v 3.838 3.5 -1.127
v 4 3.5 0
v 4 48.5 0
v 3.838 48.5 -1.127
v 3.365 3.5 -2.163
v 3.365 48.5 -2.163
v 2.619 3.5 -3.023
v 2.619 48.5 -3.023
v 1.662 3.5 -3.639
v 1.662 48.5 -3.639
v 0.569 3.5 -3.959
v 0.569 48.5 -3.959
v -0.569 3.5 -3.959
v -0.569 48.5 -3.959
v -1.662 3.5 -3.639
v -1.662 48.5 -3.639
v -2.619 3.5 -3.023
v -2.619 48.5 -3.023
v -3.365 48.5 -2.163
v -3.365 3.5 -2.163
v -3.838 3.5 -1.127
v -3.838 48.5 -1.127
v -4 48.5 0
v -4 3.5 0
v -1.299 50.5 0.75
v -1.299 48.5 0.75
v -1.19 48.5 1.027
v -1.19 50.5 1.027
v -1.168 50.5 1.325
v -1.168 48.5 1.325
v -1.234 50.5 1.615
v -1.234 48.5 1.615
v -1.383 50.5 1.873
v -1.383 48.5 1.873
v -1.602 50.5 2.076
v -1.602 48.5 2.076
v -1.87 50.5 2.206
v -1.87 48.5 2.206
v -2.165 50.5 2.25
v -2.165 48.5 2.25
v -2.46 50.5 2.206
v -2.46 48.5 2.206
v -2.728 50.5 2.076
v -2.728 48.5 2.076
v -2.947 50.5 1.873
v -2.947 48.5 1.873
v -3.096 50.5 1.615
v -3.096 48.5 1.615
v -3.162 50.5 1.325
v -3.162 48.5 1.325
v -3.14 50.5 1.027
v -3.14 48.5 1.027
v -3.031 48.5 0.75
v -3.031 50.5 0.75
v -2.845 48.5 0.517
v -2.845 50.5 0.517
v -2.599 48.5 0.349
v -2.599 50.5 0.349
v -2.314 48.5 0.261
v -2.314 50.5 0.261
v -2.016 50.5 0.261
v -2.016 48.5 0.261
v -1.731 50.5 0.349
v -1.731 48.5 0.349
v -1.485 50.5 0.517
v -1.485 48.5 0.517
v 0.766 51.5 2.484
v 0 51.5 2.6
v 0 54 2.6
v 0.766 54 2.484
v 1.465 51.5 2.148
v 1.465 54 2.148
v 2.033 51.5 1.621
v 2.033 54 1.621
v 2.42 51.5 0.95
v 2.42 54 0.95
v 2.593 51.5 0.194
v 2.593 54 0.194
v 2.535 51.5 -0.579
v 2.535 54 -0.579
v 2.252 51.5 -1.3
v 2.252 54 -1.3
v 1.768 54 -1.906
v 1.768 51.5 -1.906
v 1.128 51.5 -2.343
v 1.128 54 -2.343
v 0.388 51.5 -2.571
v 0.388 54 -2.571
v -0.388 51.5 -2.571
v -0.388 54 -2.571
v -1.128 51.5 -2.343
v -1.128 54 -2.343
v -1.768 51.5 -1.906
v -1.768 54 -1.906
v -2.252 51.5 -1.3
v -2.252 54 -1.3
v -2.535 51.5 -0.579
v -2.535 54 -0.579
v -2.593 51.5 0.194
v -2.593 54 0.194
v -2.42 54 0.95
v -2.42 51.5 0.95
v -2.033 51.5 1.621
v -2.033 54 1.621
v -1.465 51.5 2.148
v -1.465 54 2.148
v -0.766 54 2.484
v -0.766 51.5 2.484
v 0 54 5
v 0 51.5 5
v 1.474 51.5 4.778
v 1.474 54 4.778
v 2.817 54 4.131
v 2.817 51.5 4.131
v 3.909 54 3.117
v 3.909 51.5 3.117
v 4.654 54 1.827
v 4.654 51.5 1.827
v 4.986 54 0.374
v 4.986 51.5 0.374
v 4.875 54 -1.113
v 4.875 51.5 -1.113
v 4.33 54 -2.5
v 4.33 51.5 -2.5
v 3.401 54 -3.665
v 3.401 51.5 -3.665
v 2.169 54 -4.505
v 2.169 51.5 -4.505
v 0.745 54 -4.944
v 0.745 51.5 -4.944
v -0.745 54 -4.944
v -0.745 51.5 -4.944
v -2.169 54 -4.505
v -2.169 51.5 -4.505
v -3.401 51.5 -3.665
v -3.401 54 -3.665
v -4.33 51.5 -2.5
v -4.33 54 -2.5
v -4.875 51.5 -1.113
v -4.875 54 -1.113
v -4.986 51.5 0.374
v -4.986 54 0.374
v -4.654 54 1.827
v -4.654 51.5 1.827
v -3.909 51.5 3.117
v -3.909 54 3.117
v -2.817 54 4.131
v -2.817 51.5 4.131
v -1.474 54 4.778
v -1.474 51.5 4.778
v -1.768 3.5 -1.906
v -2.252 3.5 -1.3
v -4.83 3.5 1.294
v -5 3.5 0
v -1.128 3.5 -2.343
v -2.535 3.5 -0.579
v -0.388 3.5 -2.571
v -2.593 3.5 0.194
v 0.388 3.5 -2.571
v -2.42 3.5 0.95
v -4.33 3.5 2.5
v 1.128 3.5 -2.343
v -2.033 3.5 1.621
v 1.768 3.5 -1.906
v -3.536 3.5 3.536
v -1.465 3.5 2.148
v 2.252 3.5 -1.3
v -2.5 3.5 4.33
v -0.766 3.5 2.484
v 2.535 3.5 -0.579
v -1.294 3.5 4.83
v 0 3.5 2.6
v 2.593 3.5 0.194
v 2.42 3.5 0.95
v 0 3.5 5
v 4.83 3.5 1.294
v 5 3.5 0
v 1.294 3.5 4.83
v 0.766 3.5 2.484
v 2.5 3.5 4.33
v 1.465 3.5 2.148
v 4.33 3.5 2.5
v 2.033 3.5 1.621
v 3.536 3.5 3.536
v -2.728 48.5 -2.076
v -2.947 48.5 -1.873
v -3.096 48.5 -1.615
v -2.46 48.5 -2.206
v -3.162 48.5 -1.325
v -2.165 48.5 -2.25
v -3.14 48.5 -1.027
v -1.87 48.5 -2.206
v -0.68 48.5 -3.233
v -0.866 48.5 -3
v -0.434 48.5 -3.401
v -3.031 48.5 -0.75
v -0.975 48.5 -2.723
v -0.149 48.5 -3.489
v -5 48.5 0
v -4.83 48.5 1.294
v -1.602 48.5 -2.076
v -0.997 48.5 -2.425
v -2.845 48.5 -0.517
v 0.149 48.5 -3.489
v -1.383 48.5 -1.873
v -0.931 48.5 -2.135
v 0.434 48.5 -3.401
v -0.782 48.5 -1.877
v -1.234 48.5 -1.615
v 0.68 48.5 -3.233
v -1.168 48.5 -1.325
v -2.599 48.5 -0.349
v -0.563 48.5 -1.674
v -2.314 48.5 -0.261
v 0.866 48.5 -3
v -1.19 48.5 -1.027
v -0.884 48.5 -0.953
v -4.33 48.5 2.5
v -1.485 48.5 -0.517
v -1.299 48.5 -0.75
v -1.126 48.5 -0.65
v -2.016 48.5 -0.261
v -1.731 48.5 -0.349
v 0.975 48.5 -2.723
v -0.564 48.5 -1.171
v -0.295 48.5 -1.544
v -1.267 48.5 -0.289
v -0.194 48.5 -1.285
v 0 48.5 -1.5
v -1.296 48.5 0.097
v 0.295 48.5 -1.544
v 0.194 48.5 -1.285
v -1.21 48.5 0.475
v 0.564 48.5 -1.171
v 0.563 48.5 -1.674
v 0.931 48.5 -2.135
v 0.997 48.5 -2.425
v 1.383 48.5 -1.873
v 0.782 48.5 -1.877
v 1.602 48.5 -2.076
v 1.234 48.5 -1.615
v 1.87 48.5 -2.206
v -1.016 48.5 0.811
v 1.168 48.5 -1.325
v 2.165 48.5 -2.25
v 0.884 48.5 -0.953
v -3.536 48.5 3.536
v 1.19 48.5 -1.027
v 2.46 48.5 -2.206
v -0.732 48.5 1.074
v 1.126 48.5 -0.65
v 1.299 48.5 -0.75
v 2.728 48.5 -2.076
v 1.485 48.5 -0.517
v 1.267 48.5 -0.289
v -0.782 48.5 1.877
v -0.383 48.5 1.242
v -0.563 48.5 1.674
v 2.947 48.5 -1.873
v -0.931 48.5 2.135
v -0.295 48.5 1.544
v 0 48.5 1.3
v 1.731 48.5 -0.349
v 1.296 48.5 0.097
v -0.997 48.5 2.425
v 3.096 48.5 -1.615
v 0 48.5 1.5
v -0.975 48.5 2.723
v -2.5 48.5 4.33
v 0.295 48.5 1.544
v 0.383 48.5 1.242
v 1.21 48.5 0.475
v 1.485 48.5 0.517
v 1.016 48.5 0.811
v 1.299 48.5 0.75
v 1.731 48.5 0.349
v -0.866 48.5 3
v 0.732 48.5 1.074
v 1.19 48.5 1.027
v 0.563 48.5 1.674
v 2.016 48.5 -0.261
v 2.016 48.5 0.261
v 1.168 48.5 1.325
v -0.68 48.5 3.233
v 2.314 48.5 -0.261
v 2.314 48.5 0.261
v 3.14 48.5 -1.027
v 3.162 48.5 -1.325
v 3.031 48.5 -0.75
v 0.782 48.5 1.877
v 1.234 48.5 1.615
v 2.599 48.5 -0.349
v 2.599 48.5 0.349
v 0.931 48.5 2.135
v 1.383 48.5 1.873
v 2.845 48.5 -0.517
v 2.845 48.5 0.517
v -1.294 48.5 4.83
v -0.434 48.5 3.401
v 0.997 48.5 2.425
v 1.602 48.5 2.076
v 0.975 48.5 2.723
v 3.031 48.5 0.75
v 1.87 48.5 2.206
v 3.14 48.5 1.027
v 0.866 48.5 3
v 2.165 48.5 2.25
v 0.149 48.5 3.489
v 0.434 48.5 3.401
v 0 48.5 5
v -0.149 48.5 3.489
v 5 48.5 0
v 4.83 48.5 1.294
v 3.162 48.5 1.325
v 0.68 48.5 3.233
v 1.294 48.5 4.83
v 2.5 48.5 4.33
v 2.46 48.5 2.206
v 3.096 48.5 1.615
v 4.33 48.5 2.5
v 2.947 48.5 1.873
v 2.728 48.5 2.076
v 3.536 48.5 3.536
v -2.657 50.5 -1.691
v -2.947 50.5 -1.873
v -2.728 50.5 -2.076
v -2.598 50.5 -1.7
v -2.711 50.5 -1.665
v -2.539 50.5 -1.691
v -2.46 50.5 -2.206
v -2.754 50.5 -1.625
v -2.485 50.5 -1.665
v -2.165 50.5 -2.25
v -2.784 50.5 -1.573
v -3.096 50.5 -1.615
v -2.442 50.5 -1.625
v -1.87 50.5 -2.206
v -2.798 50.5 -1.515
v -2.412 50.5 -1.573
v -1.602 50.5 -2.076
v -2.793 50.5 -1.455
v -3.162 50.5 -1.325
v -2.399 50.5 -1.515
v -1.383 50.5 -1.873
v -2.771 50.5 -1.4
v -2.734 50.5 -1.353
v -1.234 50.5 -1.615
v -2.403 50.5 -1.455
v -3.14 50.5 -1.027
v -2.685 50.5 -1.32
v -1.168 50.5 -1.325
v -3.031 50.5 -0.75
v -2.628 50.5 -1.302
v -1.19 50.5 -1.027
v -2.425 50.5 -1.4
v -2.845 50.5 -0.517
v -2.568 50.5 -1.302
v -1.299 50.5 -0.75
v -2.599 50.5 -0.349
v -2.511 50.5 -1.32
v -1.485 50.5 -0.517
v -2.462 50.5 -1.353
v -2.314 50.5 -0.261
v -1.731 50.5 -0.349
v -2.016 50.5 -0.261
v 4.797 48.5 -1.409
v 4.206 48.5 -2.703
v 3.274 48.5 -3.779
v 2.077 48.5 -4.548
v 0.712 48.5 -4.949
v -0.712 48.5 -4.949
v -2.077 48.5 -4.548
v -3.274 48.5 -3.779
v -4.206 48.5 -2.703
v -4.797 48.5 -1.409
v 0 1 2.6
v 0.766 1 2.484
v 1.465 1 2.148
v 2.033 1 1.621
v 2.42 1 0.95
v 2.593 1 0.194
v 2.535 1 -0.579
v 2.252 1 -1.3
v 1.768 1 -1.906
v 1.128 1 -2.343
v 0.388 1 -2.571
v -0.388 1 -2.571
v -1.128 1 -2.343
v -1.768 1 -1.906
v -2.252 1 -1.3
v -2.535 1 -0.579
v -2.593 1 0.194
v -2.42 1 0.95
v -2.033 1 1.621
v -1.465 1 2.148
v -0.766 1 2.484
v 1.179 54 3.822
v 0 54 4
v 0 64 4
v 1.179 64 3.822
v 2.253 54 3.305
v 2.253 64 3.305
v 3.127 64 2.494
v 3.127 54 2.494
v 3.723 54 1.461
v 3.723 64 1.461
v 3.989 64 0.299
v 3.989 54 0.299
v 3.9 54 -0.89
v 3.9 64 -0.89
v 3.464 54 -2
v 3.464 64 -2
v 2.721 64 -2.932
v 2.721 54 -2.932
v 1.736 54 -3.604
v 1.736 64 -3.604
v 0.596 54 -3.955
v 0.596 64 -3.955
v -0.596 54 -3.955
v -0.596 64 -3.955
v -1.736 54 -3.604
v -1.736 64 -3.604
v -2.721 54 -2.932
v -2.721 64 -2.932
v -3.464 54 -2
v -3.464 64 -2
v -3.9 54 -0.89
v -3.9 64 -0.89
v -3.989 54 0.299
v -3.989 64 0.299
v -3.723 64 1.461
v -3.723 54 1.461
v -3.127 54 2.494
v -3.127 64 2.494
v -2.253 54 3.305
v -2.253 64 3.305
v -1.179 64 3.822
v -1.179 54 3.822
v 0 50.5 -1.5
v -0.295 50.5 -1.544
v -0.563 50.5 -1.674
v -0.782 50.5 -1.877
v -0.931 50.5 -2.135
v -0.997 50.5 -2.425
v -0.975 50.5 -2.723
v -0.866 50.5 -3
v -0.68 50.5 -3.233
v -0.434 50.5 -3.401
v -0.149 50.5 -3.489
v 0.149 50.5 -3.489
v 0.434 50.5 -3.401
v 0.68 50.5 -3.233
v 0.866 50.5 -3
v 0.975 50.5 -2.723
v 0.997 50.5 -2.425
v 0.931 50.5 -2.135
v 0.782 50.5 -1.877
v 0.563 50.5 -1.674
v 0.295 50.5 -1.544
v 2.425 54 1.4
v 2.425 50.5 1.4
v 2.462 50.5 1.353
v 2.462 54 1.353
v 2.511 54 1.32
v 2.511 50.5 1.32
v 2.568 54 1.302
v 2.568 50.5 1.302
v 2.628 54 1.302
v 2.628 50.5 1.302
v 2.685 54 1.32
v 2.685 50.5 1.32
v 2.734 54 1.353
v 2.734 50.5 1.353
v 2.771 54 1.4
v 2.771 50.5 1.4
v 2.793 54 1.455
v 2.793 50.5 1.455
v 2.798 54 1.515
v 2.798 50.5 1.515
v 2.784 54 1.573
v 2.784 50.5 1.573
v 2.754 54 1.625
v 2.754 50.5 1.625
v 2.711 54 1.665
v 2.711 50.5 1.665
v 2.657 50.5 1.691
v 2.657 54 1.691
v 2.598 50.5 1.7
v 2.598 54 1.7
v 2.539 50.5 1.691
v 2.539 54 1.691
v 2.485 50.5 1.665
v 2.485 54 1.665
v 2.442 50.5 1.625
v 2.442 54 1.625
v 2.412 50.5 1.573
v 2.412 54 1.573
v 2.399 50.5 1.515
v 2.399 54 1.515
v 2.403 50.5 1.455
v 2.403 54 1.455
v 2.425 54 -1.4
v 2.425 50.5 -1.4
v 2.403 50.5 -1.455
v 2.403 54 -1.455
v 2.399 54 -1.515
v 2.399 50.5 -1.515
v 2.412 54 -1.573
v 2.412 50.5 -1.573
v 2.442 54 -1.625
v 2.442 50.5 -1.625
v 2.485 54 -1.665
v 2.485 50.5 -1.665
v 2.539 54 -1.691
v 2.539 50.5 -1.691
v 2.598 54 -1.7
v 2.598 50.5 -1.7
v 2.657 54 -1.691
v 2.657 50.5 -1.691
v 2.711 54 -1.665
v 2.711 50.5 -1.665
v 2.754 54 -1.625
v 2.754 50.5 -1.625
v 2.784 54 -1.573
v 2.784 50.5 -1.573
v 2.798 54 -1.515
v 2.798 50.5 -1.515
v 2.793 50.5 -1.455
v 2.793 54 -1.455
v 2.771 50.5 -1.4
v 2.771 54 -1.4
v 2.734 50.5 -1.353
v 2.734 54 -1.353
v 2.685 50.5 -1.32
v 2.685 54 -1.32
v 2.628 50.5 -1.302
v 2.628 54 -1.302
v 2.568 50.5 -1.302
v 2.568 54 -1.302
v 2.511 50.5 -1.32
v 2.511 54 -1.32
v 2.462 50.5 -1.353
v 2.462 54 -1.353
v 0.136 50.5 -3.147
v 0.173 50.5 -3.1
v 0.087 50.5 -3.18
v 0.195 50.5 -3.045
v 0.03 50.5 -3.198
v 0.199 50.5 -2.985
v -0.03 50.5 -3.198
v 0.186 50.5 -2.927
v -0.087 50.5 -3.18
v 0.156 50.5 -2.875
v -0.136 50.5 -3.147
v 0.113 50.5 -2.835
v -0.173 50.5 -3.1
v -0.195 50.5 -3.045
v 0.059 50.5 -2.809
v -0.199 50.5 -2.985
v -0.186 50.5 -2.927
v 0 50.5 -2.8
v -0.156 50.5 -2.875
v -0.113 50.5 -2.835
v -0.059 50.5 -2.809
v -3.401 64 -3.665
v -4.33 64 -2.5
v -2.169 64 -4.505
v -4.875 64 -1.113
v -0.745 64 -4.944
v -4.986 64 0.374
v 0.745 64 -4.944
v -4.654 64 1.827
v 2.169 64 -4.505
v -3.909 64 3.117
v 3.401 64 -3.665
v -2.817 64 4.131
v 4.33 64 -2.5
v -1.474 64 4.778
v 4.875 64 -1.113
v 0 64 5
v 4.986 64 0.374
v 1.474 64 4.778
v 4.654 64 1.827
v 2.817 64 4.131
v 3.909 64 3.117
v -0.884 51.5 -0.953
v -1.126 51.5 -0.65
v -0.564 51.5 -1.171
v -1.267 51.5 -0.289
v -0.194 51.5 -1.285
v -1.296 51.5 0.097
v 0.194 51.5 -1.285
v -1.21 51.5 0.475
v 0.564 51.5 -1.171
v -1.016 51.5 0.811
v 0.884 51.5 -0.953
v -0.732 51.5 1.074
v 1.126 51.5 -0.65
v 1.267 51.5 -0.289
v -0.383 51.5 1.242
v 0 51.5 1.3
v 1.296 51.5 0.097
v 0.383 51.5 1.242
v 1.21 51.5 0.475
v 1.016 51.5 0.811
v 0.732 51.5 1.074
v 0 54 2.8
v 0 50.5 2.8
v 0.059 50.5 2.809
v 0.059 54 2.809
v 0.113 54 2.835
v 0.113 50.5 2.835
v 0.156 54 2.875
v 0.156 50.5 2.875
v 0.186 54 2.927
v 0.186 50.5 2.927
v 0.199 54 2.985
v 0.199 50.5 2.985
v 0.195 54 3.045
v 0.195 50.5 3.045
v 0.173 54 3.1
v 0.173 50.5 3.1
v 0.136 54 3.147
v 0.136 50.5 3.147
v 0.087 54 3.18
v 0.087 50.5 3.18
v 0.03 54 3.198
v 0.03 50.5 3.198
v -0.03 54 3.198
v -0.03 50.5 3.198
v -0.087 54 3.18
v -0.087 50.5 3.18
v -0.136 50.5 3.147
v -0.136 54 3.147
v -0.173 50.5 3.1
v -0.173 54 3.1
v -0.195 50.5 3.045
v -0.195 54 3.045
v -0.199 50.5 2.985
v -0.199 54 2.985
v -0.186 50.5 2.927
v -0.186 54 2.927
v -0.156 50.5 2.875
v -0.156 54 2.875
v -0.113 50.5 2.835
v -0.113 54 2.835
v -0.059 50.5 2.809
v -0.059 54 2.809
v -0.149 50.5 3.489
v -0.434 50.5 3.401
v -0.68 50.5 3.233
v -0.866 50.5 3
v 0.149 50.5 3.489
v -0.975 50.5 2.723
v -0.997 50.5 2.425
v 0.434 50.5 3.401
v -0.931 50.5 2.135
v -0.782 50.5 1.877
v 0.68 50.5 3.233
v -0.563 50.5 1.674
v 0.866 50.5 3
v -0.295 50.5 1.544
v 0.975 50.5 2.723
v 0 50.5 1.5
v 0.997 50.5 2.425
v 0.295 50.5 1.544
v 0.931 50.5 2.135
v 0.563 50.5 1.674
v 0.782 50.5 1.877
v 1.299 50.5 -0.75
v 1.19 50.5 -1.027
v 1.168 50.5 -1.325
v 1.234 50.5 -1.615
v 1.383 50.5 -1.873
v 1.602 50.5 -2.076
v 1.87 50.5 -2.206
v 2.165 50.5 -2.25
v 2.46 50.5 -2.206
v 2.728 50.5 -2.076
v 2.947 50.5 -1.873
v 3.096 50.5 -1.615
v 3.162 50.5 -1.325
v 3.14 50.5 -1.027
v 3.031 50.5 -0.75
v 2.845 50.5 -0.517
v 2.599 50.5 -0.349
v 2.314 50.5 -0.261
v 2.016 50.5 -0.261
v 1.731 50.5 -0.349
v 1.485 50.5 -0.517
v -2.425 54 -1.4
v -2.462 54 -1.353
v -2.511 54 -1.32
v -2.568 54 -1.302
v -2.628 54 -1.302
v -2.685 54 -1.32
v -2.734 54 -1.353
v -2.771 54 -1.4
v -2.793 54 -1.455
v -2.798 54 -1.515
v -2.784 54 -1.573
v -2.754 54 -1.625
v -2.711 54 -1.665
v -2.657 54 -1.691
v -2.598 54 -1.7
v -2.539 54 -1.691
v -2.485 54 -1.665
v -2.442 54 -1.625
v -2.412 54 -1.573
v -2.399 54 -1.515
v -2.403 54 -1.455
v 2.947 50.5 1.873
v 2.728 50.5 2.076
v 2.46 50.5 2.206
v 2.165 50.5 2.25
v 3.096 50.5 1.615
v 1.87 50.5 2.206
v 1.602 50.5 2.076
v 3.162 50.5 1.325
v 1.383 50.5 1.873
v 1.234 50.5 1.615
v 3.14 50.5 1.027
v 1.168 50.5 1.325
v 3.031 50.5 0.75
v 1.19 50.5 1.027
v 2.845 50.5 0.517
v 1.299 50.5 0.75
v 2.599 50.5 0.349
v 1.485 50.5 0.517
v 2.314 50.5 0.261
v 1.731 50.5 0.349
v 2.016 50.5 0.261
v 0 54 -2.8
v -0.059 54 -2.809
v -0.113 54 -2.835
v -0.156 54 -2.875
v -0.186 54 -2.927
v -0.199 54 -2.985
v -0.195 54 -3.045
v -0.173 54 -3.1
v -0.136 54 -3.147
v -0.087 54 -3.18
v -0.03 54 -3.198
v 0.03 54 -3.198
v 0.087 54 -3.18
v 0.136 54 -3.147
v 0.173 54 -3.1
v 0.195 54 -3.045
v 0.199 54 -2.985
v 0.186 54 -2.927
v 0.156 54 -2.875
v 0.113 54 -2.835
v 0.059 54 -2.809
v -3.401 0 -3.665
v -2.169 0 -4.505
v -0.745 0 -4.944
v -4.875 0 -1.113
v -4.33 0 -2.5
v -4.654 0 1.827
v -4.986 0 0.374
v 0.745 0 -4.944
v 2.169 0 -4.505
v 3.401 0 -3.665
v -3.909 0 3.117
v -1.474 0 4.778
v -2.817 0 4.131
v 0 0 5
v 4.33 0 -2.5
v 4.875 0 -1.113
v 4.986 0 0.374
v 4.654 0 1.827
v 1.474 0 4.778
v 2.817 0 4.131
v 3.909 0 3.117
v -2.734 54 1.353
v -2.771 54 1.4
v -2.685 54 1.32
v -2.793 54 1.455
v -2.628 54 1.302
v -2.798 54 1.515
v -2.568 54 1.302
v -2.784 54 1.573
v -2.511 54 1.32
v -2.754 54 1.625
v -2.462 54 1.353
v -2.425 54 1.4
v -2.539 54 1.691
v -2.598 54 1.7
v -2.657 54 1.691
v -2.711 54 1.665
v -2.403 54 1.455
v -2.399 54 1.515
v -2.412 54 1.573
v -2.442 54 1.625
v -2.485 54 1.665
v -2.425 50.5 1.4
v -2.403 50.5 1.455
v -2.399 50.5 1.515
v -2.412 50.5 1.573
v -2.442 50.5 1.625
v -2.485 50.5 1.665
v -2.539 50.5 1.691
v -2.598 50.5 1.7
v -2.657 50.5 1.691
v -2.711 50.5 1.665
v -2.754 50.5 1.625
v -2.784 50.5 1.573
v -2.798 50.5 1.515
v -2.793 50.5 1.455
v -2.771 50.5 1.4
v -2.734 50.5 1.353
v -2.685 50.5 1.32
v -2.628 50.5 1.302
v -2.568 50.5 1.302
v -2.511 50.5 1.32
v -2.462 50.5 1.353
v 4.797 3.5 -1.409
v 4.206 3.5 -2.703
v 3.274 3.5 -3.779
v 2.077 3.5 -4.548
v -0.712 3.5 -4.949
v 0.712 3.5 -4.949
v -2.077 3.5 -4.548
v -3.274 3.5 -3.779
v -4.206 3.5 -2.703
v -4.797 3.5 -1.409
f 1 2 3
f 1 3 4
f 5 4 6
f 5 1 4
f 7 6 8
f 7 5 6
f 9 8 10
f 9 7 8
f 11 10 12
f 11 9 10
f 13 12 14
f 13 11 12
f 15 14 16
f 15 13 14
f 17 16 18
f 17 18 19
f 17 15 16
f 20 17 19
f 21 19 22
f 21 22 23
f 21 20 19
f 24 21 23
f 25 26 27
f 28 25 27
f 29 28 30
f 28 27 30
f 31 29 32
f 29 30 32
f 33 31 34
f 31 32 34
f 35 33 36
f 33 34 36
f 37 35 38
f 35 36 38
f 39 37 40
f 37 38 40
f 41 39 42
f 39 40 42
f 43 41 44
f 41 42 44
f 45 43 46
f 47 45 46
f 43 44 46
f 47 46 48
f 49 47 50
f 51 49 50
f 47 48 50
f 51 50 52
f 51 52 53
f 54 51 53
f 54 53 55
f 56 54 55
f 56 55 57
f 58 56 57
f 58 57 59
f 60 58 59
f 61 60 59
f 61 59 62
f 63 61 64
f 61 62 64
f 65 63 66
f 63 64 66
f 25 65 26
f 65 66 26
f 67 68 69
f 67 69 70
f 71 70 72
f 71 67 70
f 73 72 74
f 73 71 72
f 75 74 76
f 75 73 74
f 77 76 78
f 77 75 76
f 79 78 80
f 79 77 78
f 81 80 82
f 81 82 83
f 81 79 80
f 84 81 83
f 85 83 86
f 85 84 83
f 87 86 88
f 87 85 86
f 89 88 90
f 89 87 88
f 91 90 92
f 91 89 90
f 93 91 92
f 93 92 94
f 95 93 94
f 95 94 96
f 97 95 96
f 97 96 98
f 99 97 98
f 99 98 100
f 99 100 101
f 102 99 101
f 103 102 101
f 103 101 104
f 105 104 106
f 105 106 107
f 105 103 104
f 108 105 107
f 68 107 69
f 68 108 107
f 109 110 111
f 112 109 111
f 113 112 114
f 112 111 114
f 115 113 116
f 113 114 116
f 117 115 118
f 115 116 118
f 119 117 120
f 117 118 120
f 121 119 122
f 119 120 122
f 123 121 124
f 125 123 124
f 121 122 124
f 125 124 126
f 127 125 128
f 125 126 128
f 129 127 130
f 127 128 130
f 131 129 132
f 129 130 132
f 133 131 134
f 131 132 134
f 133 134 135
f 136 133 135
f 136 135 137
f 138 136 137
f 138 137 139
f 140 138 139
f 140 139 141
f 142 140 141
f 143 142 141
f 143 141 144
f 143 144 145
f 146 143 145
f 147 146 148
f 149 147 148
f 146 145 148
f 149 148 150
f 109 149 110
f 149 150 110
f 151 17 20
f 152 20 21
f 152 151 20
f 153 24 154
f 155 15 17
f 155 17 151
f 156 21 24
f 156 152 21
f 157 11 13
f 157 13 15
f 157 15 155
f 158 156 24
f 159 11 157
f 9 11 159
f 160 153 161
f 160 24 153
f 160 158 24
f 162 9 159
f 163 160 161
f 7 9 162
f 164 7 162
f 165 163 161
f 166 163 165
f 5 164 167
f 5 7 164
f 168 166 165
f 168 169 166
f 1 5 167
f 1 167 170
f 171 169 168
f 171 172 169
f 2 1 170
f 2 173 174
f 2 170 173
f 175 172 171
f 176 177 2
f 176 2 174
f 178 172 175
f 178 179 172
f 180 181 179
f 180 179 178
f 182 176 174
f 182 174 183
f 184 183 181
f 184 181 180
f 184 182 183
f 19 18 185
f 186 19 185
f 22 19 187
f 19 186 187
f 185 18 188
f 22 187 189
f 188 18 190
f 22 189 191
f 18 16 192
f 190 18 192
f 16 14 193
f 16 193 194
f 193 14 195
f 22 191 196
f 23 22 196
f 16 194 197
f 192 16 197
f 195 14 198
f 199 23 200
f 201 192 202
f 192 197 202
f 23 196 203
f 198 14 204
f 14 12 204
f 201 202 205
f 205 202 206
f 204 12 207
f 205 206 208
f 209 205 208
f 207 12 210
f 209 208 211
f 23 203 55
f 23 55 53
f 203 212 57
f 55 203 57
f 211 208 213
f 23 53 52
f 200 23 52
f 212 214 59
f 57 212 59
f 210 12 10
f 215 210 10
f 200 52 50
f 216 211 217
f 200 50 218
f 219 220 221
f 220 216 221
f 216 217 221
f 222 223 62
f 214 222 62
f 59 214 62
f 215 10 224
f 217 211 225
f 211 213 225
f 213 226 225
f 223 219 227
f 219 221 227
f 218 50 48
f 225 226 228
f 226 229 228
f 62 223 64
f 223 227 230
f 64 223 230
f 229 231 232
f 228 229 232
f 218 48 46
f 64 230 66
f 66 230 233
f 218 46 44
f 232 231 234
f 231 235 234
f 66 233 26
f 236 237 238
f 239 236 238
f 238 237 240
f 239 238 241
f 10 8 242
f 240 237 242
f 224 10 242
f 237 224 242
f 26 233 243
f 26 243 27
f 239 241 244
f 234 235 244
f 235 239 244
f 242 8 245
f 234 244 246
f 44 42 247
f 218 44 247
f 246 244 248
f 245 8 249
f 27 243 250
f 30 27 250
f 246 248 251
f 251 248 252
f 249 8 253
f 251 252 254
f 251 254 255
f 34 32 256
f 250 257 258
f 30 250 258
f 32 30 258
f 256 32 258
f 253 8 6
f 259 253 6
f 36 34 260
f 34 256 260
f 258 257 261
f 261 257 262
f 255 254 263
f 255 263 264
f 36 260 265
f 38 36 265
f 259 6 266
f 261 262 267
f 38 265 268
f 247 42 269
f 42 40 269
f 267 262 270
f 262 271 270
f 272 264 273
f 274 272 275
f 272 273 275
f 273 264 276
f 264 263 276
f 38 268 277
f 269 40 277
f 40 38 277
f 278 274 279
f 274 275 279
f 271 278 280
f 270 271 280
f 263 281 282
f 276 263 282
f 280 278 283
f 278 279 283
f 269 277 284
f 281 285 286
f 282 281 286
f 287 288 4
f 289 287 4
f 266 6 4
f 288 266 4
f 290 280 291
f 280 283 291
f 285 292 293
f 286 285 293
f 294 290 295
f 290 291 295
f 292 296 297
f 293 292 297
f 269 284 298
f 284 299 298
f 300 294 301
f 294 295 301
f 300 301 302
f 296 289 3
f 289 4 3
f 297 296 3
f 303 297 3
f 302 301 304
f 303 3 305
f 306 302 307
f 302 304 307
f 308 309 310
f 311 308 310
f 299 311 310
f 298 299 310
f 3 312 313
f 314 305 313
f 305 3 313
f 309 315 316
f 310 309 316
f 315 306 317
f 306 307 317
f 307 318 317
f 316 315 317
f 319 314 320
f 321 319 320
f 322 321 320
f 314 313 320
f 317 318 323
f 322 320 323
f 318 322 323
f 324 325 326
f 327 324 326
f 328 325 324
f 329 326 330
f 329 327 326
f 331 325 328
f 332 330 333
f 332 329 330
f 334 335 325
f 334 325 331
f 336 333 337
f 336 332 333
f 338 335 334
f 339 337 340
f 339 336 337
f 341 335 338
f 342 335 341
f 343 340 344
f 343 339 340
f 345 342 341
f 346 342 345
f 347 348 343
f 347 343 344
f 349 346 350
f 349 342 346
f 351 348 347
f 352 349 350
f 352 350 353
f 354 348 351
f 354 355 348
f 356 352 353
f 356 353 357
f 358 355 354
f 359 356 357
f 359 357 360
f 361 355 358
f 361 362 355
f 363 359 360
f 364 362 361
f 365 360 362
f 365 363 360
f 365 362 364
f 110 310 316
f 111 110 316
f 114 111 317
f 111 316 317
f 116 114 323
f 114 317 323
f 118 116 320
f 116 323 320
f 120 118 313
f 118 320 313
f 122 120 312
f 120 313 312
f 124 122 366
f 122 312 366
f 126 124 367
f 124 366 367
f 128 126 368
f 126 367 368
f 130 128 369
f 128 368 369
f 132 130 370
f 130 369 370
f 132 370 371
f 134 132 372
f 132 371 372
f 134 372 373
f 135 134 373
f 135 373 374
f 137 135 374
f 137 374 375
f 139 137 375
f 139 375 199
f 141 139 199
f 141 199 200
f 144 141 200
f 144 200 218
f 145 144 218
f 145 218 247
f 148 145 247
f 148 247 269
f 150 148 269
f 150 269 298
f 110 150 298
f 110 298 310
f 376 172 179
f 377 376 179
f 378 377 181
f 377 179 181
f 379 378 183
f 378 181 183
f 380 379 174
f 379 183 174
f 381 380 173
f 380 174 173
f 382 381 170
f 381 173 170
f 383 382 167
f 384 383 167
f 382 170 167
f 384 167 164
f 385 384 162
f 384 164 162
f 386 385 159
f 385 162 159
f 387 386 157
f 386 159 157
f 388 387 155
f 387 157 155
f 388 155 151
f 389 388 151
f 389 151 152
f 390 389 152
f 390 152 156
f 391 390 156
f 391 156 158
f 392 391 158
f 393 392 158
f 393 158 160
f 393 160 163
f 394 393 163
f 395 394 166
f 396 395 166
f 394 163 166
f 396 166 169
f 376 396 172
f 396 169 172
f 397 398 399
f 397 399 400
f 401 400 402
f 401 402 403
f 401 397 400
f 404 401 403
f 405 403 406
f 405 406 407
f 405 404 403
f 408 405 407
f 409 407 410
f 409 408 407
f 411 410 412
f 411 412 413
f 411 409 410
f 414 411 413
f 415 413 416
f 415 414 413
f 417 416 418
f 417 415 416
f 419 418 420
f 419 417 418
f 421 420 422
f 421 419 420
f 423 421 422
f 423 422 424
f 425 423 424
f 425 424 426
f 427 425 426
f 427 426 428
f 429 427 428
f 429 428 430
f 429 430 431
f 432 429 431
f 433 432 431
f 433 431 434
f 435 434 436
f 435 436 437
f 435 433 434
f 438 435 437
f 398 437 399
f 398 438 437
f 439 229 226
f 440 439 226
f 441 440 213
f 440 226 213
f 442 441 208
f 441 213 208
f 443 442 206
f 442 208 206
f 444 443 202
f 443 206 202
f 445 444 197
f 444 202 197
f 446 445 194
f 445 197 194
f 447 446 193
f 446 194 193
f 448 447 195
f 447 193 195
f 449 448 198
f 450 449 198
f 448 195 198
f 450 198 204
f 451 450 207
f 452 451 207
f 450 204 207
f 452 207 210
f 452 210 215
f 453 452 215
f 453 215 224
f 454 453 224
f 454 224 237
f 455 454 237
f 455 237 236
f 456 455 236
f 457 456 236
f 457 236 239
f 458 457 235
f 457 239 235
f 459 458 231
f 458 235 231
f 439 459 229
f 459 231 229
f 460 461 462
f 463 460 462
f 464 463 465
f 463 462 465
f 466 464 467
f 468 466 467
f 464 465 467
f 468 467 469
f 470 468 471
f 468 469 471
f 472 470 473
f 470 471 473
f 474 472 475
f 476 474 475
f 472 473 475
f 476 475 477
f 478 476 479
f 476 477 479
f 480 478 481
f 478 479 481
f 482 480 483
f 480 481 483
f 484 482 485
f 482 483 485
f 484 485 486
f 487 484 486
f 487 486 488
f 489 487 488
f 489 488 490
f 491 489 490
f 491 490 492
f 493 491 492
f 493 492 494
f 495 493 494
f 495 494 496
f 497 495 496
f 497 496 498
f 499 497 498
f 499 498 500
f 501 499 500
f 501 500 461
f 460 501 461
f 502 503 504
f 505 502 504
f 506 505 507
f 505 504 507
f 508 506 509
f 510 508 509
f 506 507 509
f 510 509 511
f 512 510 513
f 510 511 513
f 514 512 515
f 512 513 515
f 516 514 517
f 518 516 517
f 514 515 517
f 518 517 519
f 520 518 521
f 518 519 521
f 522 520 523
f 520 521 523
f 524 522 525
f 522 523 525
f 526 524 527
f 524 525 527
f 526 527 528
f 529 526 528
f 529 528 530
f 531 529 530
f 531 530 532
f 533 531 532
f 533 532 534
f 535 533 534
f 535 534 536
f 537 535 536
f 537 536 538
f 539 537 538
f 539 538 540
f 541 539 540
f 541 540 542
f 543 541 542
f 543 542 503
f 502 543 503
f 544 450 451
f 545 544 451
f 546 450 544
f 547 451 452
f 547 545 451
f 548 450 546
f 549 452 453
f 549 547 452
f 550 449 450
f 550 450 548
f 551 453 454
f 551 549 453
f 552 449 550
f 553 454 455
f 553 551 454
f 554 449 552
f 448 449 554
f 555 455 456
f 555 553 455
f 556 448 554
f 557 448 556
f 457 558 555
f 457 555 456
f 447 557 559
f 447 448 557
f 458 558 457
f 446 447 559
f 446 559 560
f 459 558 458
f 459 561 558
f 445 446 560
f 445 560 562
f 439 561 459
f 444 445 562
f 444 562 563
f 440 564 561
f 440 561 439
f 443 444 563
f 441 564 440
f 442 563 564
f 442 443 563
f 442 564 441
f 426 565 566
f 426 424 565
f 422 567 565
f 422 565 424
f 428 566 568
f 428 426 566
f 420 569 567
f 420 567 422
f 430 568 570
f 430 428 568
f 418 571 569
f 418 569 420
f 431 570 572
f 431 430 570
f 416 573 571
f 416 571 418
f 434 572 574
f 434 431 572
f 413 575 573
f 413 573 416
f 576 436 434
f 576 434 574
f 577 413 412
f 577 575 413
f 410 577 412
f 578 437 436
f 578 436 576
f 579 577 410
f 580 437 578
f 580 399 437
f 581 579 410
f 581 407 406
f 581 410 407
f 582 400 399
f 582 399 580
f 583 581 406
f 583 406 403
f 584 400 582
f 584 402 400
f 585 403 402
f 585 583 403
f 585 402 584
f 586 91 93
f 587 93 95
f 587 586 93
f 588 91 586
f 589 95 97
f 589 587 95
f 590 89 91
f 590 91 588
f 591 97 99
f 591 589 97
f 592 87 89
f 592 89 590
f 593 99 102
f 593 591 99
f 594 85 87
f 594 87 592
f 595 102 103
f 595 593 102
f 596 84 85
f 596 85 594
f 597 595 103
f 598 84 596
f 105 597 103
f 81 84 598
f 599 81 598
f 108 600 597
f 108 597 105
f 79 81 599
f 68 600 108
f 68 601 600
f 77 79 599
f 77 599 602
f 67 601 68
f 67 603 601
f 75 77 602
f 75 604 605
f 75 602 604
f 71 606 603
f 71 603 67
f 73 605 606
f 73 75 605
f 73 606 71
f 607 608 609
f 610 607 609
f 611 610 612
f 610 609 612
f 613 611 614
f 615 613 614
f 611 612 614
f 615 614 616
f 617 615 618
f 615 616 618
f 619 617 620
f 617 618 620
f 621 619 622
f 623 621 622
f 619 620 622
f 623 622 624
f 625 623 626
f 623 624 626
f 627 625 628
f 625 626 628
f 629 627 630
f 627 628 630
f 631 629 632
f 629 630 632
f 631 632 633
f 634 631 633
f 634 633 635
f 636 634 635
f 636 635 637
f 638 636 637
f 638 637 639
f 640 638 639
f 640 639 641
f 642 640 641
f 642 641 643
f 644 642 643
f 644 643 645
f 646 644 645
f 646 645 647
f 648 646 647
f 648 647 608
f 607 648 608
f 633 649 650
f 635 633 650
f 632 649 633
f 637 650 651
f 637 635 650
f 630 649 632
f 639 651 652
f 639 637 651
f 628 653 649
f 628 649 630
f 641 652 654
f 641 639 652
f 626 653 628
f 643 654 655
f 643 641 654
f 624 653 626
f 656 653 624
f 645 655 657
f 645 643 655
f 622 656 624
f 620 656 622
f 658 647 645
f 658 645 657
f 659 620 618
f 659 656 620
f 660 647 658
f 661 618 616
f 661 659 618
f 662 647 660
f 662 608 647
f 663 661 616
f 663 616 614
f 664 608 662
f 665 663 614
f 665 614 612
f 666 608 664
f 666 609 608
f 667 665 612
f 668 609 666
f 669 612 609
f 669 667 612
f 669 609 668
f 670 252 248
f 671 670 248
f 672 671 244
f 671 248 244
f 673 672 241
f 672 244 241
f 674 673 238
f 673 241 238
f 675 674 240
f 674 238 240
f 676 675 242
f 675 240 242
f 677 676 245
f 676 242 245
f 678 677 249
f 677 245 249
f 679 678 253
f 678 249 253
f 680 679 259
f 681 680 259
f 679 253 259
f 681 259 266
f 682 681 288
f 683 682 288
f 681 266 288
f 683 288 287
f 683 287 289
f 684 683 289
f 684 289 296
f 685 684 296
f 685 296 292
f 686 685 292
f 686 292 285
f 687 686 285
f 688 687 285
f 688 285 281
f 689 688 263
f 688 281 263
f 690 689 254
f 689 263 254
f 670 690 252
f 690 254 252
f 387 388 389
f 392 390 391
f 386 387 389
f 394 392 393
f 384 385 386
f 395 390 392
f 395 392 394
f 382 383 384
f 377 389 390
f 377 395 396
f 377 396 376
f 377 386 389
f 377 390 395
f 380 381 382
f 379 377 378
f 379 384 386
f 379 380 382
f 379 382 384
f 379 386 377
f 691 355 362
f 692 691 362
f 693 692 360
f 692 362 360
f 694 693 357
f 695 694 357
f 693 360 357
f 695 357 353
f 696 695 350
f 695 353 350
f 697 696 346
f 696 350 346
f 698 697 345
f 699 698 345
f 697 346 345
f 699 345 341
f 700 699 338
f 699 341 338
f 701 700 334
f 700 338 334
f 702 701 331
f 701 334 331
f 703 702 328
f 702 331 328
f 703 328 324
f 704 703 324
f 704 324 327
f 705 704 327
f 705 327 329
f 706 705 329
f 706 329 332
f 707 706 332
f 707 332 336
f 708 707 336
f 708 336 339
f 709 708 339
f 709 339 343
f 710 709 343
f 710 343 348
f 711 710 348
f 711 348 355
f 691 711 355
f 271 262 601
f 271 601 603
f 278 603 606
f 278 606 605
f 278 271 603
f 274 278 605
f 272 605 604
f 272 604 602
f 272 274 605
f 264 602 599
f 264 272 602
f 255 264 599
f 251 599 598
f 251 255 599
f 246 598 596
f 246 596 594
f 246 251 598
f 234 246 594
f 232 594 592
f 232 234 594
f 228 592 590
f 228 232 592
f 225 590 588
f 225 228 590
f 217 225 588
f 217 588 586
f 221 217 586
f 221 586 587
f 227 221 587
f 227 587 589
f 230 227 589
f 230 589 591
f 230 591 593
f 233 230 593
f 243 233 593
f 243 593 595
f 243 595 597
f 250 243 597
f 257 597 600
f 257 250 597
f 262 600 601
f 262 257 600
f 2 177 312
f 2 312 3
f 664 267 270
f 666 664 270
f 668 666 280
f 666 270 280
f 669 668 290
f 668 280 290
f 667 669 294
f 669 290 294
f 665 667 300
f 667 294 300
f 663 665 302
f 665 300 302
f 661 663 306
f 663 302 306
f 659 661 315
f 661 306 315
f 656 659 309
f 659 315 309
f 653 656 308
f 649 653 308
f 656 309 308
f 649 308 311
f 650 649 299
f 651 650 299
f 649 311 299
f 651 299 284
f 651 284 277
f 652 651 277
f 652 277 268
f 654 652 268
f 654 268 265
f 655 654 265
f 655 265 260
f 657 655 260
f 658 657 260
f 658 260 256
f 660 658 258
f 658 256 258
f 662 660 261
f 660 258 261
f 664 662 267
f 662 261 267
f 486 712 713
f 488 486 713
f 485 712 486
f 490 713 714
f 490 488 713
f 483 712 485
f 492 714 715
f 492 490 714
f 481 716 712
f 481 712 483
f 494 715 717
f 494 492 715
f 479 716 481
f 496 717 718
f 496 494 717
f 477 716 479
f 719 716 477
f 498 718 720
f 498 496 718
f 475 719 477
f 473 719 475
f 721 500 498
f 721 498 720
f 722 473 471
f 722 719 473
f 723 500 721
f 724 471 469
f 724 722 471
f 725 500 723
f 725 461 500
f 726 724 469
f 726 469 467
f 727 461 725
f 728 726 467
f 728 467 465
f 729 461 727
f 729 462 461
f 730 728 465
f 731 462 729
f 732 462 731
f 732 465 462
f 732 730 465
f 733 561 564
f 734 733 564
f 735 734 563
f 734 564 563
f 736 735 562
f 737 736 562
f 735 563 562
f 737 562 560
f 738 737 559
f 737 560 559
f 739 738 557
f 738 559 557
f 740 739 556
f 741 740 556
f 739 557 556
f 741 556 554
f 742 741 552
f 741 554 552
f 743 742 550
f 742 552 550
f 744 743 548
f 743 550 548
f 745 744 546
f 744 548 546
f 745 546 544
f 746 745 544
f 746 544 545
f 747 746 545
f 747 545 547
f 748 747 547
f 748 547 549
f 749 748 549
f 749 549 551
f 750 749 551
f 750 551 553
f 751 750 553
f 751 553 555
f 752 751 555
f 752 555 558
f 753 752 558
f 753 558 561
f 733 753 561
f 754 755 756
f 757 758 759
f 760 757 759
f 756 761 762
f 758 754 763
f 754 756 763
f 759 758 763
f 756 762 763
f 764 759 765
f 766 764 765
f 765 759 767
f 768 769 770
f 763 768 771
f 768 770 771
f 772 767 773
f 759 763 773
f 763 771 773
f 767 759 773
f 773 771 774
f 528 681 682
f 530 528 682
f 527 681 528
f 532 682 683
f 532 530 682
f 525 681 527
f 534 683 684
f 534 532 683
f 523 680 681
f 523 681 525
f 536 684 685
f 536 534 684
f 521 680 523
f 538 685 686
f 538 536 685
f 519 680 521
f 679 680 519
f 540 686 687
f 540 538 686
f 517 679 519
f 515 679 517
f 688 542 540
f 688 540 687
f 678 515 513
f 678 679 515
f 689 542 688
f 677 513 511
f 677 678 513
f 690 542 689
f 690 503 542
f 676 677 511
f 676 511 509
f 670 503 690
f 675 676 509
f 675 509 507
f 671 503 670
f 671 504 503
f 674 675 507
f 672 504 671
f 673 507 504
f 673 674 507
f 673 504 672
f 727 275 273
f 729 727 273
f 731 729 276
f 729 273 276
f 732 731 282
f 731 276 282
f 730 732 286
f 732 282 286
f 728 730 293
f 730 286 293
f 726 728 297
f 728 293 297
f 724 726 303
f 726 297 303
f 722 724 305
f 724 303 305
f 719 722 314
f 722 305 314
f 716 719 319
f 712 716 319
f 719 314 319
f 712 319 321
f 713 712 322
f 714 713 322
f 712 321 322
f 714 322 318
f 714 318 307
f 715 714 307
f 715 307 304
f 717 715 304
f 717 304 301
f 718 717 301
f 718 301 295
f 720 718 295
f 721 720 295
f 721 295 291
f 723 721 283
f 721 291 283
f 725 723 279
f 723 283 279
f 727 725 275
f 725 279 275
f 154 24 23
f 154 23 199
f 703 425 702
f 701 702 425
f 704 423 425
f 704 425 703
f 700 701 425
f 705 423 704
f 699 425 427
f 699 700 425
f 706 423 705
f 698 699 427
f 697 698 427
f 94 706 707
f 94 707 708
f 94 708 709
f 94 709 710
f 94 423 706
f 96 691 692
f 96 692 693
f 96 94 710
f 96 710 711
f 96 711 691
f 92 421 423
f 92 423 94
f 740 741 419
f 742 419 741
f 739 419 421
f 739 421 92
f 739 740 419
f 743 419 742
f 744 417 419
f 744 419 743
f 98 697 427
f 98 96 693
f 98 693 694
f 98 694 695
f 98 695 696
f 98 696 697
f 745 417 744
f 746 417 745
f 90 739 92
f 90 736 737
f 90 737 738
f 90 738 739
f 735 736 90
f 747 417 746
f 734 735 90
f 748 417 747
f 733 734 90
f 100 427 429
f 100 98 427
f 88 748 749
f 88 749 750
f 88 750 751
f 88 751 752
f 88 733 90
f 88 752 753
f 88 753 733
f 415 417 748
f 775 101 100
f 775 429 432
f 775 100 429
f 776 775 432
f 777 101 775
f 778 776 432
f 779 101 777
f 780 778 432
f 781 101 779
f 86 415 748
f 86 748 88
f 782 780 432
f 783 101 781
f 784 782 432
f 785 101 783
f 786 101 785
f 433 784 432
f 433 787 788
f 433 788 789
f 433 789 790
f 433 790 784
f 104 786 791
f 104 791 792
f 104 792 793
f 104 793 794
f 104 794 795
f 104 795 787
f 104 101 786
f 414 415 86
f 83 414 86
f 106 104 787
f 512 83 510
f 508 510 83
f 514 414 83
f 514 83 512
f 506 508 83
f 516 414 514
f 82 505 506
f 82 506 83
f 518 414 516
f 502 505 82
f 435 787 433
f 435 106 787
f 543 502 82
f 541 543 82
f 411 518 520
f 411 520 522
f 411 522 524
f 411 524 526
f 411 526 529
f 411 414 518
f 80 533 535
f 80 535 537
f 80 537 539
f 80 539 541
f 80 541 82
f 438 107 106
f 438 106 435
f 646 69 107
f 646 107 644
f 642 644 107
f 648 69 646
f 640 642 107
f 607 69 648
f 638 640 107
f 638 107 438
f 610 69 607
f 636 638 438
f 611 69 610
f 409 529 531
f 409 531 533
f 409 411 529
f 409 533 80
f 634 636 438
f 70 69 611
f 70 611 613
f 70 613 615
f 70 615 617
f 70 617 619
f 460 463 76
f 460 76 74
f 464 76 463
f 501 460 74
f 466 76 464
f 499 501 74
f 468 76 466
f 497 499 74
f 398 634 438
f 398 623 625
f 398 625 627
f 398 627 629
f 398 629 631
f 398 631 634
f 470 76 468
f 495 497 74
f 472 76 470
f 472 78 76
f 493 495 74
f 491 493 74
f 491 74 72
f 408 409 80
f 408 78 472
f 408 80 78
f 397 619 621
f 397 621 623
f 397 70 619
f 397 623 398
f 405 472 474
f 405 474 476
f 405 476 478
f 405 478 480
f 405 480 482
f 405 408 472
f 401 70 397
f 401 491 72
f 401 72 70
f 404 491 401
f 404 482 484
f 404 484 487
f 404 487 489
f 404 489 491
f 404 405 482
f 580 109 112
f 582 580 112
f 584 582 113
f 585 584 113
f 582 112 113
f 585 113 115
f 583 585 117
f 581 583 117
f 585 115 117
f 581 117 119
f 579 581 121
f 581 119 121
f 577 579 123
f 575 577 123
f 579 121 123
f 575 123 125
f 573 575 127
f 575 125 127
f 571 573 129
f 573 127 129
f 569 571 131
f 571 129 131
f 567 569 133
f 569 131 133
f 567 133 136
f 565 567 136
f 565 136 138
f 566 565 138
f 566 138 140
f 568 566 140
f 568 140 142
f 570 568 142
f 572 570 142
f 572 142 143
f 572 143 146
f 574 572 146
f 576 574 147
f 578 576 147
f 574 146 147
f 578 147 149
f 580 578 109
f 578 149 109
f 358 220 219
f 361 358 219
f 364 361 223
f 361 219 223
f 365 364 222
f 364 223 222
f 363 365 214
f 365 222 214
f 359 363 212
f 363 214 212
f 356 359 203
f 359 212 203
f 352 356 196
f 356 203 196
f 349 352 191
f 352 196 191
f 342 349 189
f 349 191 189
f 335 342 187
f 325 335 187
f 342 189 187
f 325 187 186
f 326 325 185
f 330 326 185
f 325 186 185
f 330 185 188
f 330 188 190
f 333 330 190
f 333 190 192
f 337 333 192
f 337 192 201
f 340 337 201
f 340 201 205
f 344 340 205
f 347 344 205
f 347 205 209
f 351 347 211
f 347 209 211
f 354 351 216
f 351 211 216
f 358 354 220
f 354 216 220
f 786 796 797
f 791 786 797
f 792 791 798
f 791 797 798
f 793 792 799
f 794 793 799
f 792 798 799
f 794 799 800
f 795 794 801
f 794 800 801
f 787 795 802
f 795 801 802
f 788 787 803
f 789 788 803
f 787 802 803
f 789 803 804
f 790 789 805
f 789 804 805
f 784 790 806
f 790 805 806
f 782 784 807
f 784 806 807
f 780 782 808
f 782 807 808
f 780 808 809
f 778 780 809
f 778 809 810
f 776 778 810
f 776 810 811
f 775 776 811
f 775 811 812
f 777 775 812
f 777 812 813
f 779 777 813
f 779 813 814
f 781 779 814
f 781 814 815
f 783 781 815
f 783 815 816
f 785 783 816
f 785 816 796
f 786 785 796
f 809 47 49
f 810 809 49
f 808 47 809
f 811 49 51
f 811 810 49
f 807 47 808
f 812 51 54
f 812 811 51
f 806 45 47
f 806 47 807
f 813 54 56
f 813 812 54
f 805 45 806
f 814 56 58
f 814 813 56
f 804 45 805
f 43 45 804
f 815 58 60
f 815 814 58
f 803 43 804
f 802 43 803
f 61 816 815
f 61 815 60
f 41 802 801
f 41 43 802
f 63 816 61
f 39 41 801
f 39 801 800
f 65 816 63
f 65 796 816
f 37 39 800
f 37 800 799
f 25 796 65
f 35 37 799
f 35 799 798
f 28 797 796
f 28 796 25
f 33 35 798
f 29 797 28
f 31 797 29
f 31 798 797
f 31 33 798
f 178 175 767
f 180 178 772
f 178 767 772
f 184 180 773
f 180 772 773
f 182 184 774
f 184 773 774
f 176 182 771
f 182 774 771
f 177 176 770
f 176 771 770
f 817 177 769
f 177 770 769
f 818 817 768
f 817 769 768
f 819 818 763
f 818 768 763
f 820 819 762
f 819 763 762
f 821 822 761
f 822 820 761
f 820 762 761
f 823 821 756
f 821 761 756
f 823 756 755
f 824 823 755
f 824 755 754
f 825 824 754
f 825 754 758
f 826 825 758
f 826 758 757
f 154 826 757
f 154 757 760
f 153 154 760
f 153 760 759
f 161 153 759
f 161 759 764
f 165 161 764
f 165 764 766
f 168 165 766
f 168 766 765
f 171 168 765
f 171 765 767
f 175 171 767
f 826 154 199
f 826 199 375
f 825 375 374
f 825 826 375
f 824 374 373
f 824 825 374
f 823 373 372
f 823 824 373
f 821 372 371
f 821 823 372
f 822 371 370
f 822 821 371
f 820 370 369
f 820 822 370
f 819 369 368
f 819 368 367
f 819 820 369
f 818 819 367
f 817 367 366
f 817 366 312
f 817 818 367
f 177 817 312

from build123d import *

# Parameters (mm, degrees)
SKETCH1_R           = 5
BOSS_EXTRUDE1_DEPTH = 3.5
SKETCH2_R           = 2.6
CUT_EXTRUDE1_DEPTH  = 2.5
BOSS_EXTRUDE2_DEPTH = 45
SKETCH4_R           = 5
SKETCH4_R_2         = 1.3
BOSS_EXTRUDE3_DEPTH = 3
SKETCH7_R           = 1
CUT_EXTRUDE2_DEPTH  = 2
CIRPATTERN1_COUNT   = 6
SKETCH8_R           = 5
SKETCH8_R_2         = 2.6
BOSS_EXTRUDE4_DEPTH = 2.5
SKETCH9_R           = 0.2
CUT_EXTRUDE3_DEPTH  = 50.012753442
CIRPATTERN2_COUNT   = 6
SKETCH10_R          = 5
SKETCH10_R_2        = 4
BOSS_EXTRUDE5_DEPTH = 10


with BuildPart() as part:
    # Sketch1 → Boss-Extrude1 (new body)
    with BuildSketch(Plane(origin=(0, 0, 0), x_dir=(1, 0, 0), z_dir=(0, 1, 0))):
        with Locations(Location((0, 0, 0), (0, 0, 270))):
            Circle(SKETCH1_R)
    extrude(amount=BOSS_EXTRUDE1_DEPTH)

    # Sketch2 → Cut-Extrude1 (cut)
    with BuildSketch(Plane(origin=(0, 3.5, 0), x_dir=(1, 0, 0), z_dir=(0, 1, 0))):
        with Locations(Location((0, 0, 0), (0, 0, 270))):
            Circle(SKETCH2_R)
    extrude(amount=-CUT_EXTRUDE1_DEPTH, mode=Mode.SUBTRACT)

    # Sketch3 → Boss-Extrude2 (add)
    with BuildSketch(Plane(origin=(0, 3.5, 0), x_dir=(1, 0, 0), z_dir=(0, 1, 0))):
        with BuildLine():
            Line((5, 0), (4, 0))
            ThreePointArc((4, 0), (0, 4), (-4, 0))
            Line((-4, 0), (-5, 0))
            ThreePointArc((-5, 0), (0, 5), (5, 0))
        make_face()
    extrude(amount=BOSS_EXTRUDE2_DEPTH)

    # Sketch4 → Boss-Extrude3 (add)
    with BuildSketch(Plane(origin=(0, 48.5, 0), x_dir=(1, 0, 0), z_dir=(0, 1, 0))):
        with Locations(Location((0, 0, 0), (0, 0, 270))):
            Circle(SKETCH4_R)
        with Locations(Location((0, 0, 0), (0, 0, 270))):
            Circle(SKETCH4_R_2, mode=Mode.SUBTRACT)
    extrude(amount=BOSS_EXTRUDE3_DEPTH)

    # Sketch7 → Cut-Extrude2 (cut)
    with BuildSketch(Plane.XZ.offset(-48.5)):
        with Locations(Location((0, 2.5, 0), (0, 0, 270))):
            Circle(SKETCH7_R)
    cut_extrude2 = extrude(amount=-CUT_EXTRUDE2_DEPTH, mode=Mode.SUBTRACT)

    # CirPattern1: Cut-Extrude2 ×6 about axis
    cirpattern1_axis = Axis((0, 0, 0), (0, 1, 0))
    for i in range(1, CIRPATTERN1_COUNT):
        add(cut_extrude2.rotate(cirpattern1_axis, i * 360 / CIRPATTERN1_COUNT), mode=Mode.SUBTRACT)

    # Sketch8 → Boss-Extrude4 (add)
    with BuildSketch(Plane(origin=(0, 51.5, 0), x_dir=(1, 0, 0), z_dir=(0, 1, 0))):
        with Locations(Location((0, 0, 0), (0, 0, 270))):
            Circle(SKETCH8_R)
        with Locations(Location((0, 0, 0), (0, 0, 270))):
            Circle(SKETCH8_R_2, mode=Mode.SUBTRACT)
    extrude(amount=BOSS_EXTRUDE4_DEPTH)

    # Sketch9 → Cut-Extrude3 (cut, through all)
    with BuildSketch(Plane.XZ.offset(-48.5)):
        with Locations(Location((0, 3, 0), (0, 0, 270))):
            Circle(SKETCH9_R)
    cut_extrude3 = extrude(amount=-CUT_EXTRUDE3_DEPTH, mode=Mode.SUBTRACT)

    # CirPattern2: Cut-Extrude3 ×6 about axis
    cirpattern2_axis = Axis((0, 0, 0), (0, 1, 0))
    for i in range(1, CIRPATTERN2_COUNT):
        add(cut_extrude3.rotate(cirpattern2_axis, i * 360 / CIRPATTERN2_COUNT), mode=Mode.SUBTRACT)

    # Sketch10 → Boss-Extrude5 (add)
    with BuildSketch(Plane(origin=(0, 54, 0), x_dir=(1, 0, 0), z_dir=(0, 1, 0))):
        with Locations(Location((0, 0, 0), (0, 0, 270))):
            Circle(SKETCH10_R)
        with Locations(Location((0, 0, 0), (0, 0, 270))):
            Circle(SKETCH10_R_2, mode=Mode.SUBTRACT)
    extrude(amount=BOSS_EXTRUDE5_DEPTH)


solid = part.part
